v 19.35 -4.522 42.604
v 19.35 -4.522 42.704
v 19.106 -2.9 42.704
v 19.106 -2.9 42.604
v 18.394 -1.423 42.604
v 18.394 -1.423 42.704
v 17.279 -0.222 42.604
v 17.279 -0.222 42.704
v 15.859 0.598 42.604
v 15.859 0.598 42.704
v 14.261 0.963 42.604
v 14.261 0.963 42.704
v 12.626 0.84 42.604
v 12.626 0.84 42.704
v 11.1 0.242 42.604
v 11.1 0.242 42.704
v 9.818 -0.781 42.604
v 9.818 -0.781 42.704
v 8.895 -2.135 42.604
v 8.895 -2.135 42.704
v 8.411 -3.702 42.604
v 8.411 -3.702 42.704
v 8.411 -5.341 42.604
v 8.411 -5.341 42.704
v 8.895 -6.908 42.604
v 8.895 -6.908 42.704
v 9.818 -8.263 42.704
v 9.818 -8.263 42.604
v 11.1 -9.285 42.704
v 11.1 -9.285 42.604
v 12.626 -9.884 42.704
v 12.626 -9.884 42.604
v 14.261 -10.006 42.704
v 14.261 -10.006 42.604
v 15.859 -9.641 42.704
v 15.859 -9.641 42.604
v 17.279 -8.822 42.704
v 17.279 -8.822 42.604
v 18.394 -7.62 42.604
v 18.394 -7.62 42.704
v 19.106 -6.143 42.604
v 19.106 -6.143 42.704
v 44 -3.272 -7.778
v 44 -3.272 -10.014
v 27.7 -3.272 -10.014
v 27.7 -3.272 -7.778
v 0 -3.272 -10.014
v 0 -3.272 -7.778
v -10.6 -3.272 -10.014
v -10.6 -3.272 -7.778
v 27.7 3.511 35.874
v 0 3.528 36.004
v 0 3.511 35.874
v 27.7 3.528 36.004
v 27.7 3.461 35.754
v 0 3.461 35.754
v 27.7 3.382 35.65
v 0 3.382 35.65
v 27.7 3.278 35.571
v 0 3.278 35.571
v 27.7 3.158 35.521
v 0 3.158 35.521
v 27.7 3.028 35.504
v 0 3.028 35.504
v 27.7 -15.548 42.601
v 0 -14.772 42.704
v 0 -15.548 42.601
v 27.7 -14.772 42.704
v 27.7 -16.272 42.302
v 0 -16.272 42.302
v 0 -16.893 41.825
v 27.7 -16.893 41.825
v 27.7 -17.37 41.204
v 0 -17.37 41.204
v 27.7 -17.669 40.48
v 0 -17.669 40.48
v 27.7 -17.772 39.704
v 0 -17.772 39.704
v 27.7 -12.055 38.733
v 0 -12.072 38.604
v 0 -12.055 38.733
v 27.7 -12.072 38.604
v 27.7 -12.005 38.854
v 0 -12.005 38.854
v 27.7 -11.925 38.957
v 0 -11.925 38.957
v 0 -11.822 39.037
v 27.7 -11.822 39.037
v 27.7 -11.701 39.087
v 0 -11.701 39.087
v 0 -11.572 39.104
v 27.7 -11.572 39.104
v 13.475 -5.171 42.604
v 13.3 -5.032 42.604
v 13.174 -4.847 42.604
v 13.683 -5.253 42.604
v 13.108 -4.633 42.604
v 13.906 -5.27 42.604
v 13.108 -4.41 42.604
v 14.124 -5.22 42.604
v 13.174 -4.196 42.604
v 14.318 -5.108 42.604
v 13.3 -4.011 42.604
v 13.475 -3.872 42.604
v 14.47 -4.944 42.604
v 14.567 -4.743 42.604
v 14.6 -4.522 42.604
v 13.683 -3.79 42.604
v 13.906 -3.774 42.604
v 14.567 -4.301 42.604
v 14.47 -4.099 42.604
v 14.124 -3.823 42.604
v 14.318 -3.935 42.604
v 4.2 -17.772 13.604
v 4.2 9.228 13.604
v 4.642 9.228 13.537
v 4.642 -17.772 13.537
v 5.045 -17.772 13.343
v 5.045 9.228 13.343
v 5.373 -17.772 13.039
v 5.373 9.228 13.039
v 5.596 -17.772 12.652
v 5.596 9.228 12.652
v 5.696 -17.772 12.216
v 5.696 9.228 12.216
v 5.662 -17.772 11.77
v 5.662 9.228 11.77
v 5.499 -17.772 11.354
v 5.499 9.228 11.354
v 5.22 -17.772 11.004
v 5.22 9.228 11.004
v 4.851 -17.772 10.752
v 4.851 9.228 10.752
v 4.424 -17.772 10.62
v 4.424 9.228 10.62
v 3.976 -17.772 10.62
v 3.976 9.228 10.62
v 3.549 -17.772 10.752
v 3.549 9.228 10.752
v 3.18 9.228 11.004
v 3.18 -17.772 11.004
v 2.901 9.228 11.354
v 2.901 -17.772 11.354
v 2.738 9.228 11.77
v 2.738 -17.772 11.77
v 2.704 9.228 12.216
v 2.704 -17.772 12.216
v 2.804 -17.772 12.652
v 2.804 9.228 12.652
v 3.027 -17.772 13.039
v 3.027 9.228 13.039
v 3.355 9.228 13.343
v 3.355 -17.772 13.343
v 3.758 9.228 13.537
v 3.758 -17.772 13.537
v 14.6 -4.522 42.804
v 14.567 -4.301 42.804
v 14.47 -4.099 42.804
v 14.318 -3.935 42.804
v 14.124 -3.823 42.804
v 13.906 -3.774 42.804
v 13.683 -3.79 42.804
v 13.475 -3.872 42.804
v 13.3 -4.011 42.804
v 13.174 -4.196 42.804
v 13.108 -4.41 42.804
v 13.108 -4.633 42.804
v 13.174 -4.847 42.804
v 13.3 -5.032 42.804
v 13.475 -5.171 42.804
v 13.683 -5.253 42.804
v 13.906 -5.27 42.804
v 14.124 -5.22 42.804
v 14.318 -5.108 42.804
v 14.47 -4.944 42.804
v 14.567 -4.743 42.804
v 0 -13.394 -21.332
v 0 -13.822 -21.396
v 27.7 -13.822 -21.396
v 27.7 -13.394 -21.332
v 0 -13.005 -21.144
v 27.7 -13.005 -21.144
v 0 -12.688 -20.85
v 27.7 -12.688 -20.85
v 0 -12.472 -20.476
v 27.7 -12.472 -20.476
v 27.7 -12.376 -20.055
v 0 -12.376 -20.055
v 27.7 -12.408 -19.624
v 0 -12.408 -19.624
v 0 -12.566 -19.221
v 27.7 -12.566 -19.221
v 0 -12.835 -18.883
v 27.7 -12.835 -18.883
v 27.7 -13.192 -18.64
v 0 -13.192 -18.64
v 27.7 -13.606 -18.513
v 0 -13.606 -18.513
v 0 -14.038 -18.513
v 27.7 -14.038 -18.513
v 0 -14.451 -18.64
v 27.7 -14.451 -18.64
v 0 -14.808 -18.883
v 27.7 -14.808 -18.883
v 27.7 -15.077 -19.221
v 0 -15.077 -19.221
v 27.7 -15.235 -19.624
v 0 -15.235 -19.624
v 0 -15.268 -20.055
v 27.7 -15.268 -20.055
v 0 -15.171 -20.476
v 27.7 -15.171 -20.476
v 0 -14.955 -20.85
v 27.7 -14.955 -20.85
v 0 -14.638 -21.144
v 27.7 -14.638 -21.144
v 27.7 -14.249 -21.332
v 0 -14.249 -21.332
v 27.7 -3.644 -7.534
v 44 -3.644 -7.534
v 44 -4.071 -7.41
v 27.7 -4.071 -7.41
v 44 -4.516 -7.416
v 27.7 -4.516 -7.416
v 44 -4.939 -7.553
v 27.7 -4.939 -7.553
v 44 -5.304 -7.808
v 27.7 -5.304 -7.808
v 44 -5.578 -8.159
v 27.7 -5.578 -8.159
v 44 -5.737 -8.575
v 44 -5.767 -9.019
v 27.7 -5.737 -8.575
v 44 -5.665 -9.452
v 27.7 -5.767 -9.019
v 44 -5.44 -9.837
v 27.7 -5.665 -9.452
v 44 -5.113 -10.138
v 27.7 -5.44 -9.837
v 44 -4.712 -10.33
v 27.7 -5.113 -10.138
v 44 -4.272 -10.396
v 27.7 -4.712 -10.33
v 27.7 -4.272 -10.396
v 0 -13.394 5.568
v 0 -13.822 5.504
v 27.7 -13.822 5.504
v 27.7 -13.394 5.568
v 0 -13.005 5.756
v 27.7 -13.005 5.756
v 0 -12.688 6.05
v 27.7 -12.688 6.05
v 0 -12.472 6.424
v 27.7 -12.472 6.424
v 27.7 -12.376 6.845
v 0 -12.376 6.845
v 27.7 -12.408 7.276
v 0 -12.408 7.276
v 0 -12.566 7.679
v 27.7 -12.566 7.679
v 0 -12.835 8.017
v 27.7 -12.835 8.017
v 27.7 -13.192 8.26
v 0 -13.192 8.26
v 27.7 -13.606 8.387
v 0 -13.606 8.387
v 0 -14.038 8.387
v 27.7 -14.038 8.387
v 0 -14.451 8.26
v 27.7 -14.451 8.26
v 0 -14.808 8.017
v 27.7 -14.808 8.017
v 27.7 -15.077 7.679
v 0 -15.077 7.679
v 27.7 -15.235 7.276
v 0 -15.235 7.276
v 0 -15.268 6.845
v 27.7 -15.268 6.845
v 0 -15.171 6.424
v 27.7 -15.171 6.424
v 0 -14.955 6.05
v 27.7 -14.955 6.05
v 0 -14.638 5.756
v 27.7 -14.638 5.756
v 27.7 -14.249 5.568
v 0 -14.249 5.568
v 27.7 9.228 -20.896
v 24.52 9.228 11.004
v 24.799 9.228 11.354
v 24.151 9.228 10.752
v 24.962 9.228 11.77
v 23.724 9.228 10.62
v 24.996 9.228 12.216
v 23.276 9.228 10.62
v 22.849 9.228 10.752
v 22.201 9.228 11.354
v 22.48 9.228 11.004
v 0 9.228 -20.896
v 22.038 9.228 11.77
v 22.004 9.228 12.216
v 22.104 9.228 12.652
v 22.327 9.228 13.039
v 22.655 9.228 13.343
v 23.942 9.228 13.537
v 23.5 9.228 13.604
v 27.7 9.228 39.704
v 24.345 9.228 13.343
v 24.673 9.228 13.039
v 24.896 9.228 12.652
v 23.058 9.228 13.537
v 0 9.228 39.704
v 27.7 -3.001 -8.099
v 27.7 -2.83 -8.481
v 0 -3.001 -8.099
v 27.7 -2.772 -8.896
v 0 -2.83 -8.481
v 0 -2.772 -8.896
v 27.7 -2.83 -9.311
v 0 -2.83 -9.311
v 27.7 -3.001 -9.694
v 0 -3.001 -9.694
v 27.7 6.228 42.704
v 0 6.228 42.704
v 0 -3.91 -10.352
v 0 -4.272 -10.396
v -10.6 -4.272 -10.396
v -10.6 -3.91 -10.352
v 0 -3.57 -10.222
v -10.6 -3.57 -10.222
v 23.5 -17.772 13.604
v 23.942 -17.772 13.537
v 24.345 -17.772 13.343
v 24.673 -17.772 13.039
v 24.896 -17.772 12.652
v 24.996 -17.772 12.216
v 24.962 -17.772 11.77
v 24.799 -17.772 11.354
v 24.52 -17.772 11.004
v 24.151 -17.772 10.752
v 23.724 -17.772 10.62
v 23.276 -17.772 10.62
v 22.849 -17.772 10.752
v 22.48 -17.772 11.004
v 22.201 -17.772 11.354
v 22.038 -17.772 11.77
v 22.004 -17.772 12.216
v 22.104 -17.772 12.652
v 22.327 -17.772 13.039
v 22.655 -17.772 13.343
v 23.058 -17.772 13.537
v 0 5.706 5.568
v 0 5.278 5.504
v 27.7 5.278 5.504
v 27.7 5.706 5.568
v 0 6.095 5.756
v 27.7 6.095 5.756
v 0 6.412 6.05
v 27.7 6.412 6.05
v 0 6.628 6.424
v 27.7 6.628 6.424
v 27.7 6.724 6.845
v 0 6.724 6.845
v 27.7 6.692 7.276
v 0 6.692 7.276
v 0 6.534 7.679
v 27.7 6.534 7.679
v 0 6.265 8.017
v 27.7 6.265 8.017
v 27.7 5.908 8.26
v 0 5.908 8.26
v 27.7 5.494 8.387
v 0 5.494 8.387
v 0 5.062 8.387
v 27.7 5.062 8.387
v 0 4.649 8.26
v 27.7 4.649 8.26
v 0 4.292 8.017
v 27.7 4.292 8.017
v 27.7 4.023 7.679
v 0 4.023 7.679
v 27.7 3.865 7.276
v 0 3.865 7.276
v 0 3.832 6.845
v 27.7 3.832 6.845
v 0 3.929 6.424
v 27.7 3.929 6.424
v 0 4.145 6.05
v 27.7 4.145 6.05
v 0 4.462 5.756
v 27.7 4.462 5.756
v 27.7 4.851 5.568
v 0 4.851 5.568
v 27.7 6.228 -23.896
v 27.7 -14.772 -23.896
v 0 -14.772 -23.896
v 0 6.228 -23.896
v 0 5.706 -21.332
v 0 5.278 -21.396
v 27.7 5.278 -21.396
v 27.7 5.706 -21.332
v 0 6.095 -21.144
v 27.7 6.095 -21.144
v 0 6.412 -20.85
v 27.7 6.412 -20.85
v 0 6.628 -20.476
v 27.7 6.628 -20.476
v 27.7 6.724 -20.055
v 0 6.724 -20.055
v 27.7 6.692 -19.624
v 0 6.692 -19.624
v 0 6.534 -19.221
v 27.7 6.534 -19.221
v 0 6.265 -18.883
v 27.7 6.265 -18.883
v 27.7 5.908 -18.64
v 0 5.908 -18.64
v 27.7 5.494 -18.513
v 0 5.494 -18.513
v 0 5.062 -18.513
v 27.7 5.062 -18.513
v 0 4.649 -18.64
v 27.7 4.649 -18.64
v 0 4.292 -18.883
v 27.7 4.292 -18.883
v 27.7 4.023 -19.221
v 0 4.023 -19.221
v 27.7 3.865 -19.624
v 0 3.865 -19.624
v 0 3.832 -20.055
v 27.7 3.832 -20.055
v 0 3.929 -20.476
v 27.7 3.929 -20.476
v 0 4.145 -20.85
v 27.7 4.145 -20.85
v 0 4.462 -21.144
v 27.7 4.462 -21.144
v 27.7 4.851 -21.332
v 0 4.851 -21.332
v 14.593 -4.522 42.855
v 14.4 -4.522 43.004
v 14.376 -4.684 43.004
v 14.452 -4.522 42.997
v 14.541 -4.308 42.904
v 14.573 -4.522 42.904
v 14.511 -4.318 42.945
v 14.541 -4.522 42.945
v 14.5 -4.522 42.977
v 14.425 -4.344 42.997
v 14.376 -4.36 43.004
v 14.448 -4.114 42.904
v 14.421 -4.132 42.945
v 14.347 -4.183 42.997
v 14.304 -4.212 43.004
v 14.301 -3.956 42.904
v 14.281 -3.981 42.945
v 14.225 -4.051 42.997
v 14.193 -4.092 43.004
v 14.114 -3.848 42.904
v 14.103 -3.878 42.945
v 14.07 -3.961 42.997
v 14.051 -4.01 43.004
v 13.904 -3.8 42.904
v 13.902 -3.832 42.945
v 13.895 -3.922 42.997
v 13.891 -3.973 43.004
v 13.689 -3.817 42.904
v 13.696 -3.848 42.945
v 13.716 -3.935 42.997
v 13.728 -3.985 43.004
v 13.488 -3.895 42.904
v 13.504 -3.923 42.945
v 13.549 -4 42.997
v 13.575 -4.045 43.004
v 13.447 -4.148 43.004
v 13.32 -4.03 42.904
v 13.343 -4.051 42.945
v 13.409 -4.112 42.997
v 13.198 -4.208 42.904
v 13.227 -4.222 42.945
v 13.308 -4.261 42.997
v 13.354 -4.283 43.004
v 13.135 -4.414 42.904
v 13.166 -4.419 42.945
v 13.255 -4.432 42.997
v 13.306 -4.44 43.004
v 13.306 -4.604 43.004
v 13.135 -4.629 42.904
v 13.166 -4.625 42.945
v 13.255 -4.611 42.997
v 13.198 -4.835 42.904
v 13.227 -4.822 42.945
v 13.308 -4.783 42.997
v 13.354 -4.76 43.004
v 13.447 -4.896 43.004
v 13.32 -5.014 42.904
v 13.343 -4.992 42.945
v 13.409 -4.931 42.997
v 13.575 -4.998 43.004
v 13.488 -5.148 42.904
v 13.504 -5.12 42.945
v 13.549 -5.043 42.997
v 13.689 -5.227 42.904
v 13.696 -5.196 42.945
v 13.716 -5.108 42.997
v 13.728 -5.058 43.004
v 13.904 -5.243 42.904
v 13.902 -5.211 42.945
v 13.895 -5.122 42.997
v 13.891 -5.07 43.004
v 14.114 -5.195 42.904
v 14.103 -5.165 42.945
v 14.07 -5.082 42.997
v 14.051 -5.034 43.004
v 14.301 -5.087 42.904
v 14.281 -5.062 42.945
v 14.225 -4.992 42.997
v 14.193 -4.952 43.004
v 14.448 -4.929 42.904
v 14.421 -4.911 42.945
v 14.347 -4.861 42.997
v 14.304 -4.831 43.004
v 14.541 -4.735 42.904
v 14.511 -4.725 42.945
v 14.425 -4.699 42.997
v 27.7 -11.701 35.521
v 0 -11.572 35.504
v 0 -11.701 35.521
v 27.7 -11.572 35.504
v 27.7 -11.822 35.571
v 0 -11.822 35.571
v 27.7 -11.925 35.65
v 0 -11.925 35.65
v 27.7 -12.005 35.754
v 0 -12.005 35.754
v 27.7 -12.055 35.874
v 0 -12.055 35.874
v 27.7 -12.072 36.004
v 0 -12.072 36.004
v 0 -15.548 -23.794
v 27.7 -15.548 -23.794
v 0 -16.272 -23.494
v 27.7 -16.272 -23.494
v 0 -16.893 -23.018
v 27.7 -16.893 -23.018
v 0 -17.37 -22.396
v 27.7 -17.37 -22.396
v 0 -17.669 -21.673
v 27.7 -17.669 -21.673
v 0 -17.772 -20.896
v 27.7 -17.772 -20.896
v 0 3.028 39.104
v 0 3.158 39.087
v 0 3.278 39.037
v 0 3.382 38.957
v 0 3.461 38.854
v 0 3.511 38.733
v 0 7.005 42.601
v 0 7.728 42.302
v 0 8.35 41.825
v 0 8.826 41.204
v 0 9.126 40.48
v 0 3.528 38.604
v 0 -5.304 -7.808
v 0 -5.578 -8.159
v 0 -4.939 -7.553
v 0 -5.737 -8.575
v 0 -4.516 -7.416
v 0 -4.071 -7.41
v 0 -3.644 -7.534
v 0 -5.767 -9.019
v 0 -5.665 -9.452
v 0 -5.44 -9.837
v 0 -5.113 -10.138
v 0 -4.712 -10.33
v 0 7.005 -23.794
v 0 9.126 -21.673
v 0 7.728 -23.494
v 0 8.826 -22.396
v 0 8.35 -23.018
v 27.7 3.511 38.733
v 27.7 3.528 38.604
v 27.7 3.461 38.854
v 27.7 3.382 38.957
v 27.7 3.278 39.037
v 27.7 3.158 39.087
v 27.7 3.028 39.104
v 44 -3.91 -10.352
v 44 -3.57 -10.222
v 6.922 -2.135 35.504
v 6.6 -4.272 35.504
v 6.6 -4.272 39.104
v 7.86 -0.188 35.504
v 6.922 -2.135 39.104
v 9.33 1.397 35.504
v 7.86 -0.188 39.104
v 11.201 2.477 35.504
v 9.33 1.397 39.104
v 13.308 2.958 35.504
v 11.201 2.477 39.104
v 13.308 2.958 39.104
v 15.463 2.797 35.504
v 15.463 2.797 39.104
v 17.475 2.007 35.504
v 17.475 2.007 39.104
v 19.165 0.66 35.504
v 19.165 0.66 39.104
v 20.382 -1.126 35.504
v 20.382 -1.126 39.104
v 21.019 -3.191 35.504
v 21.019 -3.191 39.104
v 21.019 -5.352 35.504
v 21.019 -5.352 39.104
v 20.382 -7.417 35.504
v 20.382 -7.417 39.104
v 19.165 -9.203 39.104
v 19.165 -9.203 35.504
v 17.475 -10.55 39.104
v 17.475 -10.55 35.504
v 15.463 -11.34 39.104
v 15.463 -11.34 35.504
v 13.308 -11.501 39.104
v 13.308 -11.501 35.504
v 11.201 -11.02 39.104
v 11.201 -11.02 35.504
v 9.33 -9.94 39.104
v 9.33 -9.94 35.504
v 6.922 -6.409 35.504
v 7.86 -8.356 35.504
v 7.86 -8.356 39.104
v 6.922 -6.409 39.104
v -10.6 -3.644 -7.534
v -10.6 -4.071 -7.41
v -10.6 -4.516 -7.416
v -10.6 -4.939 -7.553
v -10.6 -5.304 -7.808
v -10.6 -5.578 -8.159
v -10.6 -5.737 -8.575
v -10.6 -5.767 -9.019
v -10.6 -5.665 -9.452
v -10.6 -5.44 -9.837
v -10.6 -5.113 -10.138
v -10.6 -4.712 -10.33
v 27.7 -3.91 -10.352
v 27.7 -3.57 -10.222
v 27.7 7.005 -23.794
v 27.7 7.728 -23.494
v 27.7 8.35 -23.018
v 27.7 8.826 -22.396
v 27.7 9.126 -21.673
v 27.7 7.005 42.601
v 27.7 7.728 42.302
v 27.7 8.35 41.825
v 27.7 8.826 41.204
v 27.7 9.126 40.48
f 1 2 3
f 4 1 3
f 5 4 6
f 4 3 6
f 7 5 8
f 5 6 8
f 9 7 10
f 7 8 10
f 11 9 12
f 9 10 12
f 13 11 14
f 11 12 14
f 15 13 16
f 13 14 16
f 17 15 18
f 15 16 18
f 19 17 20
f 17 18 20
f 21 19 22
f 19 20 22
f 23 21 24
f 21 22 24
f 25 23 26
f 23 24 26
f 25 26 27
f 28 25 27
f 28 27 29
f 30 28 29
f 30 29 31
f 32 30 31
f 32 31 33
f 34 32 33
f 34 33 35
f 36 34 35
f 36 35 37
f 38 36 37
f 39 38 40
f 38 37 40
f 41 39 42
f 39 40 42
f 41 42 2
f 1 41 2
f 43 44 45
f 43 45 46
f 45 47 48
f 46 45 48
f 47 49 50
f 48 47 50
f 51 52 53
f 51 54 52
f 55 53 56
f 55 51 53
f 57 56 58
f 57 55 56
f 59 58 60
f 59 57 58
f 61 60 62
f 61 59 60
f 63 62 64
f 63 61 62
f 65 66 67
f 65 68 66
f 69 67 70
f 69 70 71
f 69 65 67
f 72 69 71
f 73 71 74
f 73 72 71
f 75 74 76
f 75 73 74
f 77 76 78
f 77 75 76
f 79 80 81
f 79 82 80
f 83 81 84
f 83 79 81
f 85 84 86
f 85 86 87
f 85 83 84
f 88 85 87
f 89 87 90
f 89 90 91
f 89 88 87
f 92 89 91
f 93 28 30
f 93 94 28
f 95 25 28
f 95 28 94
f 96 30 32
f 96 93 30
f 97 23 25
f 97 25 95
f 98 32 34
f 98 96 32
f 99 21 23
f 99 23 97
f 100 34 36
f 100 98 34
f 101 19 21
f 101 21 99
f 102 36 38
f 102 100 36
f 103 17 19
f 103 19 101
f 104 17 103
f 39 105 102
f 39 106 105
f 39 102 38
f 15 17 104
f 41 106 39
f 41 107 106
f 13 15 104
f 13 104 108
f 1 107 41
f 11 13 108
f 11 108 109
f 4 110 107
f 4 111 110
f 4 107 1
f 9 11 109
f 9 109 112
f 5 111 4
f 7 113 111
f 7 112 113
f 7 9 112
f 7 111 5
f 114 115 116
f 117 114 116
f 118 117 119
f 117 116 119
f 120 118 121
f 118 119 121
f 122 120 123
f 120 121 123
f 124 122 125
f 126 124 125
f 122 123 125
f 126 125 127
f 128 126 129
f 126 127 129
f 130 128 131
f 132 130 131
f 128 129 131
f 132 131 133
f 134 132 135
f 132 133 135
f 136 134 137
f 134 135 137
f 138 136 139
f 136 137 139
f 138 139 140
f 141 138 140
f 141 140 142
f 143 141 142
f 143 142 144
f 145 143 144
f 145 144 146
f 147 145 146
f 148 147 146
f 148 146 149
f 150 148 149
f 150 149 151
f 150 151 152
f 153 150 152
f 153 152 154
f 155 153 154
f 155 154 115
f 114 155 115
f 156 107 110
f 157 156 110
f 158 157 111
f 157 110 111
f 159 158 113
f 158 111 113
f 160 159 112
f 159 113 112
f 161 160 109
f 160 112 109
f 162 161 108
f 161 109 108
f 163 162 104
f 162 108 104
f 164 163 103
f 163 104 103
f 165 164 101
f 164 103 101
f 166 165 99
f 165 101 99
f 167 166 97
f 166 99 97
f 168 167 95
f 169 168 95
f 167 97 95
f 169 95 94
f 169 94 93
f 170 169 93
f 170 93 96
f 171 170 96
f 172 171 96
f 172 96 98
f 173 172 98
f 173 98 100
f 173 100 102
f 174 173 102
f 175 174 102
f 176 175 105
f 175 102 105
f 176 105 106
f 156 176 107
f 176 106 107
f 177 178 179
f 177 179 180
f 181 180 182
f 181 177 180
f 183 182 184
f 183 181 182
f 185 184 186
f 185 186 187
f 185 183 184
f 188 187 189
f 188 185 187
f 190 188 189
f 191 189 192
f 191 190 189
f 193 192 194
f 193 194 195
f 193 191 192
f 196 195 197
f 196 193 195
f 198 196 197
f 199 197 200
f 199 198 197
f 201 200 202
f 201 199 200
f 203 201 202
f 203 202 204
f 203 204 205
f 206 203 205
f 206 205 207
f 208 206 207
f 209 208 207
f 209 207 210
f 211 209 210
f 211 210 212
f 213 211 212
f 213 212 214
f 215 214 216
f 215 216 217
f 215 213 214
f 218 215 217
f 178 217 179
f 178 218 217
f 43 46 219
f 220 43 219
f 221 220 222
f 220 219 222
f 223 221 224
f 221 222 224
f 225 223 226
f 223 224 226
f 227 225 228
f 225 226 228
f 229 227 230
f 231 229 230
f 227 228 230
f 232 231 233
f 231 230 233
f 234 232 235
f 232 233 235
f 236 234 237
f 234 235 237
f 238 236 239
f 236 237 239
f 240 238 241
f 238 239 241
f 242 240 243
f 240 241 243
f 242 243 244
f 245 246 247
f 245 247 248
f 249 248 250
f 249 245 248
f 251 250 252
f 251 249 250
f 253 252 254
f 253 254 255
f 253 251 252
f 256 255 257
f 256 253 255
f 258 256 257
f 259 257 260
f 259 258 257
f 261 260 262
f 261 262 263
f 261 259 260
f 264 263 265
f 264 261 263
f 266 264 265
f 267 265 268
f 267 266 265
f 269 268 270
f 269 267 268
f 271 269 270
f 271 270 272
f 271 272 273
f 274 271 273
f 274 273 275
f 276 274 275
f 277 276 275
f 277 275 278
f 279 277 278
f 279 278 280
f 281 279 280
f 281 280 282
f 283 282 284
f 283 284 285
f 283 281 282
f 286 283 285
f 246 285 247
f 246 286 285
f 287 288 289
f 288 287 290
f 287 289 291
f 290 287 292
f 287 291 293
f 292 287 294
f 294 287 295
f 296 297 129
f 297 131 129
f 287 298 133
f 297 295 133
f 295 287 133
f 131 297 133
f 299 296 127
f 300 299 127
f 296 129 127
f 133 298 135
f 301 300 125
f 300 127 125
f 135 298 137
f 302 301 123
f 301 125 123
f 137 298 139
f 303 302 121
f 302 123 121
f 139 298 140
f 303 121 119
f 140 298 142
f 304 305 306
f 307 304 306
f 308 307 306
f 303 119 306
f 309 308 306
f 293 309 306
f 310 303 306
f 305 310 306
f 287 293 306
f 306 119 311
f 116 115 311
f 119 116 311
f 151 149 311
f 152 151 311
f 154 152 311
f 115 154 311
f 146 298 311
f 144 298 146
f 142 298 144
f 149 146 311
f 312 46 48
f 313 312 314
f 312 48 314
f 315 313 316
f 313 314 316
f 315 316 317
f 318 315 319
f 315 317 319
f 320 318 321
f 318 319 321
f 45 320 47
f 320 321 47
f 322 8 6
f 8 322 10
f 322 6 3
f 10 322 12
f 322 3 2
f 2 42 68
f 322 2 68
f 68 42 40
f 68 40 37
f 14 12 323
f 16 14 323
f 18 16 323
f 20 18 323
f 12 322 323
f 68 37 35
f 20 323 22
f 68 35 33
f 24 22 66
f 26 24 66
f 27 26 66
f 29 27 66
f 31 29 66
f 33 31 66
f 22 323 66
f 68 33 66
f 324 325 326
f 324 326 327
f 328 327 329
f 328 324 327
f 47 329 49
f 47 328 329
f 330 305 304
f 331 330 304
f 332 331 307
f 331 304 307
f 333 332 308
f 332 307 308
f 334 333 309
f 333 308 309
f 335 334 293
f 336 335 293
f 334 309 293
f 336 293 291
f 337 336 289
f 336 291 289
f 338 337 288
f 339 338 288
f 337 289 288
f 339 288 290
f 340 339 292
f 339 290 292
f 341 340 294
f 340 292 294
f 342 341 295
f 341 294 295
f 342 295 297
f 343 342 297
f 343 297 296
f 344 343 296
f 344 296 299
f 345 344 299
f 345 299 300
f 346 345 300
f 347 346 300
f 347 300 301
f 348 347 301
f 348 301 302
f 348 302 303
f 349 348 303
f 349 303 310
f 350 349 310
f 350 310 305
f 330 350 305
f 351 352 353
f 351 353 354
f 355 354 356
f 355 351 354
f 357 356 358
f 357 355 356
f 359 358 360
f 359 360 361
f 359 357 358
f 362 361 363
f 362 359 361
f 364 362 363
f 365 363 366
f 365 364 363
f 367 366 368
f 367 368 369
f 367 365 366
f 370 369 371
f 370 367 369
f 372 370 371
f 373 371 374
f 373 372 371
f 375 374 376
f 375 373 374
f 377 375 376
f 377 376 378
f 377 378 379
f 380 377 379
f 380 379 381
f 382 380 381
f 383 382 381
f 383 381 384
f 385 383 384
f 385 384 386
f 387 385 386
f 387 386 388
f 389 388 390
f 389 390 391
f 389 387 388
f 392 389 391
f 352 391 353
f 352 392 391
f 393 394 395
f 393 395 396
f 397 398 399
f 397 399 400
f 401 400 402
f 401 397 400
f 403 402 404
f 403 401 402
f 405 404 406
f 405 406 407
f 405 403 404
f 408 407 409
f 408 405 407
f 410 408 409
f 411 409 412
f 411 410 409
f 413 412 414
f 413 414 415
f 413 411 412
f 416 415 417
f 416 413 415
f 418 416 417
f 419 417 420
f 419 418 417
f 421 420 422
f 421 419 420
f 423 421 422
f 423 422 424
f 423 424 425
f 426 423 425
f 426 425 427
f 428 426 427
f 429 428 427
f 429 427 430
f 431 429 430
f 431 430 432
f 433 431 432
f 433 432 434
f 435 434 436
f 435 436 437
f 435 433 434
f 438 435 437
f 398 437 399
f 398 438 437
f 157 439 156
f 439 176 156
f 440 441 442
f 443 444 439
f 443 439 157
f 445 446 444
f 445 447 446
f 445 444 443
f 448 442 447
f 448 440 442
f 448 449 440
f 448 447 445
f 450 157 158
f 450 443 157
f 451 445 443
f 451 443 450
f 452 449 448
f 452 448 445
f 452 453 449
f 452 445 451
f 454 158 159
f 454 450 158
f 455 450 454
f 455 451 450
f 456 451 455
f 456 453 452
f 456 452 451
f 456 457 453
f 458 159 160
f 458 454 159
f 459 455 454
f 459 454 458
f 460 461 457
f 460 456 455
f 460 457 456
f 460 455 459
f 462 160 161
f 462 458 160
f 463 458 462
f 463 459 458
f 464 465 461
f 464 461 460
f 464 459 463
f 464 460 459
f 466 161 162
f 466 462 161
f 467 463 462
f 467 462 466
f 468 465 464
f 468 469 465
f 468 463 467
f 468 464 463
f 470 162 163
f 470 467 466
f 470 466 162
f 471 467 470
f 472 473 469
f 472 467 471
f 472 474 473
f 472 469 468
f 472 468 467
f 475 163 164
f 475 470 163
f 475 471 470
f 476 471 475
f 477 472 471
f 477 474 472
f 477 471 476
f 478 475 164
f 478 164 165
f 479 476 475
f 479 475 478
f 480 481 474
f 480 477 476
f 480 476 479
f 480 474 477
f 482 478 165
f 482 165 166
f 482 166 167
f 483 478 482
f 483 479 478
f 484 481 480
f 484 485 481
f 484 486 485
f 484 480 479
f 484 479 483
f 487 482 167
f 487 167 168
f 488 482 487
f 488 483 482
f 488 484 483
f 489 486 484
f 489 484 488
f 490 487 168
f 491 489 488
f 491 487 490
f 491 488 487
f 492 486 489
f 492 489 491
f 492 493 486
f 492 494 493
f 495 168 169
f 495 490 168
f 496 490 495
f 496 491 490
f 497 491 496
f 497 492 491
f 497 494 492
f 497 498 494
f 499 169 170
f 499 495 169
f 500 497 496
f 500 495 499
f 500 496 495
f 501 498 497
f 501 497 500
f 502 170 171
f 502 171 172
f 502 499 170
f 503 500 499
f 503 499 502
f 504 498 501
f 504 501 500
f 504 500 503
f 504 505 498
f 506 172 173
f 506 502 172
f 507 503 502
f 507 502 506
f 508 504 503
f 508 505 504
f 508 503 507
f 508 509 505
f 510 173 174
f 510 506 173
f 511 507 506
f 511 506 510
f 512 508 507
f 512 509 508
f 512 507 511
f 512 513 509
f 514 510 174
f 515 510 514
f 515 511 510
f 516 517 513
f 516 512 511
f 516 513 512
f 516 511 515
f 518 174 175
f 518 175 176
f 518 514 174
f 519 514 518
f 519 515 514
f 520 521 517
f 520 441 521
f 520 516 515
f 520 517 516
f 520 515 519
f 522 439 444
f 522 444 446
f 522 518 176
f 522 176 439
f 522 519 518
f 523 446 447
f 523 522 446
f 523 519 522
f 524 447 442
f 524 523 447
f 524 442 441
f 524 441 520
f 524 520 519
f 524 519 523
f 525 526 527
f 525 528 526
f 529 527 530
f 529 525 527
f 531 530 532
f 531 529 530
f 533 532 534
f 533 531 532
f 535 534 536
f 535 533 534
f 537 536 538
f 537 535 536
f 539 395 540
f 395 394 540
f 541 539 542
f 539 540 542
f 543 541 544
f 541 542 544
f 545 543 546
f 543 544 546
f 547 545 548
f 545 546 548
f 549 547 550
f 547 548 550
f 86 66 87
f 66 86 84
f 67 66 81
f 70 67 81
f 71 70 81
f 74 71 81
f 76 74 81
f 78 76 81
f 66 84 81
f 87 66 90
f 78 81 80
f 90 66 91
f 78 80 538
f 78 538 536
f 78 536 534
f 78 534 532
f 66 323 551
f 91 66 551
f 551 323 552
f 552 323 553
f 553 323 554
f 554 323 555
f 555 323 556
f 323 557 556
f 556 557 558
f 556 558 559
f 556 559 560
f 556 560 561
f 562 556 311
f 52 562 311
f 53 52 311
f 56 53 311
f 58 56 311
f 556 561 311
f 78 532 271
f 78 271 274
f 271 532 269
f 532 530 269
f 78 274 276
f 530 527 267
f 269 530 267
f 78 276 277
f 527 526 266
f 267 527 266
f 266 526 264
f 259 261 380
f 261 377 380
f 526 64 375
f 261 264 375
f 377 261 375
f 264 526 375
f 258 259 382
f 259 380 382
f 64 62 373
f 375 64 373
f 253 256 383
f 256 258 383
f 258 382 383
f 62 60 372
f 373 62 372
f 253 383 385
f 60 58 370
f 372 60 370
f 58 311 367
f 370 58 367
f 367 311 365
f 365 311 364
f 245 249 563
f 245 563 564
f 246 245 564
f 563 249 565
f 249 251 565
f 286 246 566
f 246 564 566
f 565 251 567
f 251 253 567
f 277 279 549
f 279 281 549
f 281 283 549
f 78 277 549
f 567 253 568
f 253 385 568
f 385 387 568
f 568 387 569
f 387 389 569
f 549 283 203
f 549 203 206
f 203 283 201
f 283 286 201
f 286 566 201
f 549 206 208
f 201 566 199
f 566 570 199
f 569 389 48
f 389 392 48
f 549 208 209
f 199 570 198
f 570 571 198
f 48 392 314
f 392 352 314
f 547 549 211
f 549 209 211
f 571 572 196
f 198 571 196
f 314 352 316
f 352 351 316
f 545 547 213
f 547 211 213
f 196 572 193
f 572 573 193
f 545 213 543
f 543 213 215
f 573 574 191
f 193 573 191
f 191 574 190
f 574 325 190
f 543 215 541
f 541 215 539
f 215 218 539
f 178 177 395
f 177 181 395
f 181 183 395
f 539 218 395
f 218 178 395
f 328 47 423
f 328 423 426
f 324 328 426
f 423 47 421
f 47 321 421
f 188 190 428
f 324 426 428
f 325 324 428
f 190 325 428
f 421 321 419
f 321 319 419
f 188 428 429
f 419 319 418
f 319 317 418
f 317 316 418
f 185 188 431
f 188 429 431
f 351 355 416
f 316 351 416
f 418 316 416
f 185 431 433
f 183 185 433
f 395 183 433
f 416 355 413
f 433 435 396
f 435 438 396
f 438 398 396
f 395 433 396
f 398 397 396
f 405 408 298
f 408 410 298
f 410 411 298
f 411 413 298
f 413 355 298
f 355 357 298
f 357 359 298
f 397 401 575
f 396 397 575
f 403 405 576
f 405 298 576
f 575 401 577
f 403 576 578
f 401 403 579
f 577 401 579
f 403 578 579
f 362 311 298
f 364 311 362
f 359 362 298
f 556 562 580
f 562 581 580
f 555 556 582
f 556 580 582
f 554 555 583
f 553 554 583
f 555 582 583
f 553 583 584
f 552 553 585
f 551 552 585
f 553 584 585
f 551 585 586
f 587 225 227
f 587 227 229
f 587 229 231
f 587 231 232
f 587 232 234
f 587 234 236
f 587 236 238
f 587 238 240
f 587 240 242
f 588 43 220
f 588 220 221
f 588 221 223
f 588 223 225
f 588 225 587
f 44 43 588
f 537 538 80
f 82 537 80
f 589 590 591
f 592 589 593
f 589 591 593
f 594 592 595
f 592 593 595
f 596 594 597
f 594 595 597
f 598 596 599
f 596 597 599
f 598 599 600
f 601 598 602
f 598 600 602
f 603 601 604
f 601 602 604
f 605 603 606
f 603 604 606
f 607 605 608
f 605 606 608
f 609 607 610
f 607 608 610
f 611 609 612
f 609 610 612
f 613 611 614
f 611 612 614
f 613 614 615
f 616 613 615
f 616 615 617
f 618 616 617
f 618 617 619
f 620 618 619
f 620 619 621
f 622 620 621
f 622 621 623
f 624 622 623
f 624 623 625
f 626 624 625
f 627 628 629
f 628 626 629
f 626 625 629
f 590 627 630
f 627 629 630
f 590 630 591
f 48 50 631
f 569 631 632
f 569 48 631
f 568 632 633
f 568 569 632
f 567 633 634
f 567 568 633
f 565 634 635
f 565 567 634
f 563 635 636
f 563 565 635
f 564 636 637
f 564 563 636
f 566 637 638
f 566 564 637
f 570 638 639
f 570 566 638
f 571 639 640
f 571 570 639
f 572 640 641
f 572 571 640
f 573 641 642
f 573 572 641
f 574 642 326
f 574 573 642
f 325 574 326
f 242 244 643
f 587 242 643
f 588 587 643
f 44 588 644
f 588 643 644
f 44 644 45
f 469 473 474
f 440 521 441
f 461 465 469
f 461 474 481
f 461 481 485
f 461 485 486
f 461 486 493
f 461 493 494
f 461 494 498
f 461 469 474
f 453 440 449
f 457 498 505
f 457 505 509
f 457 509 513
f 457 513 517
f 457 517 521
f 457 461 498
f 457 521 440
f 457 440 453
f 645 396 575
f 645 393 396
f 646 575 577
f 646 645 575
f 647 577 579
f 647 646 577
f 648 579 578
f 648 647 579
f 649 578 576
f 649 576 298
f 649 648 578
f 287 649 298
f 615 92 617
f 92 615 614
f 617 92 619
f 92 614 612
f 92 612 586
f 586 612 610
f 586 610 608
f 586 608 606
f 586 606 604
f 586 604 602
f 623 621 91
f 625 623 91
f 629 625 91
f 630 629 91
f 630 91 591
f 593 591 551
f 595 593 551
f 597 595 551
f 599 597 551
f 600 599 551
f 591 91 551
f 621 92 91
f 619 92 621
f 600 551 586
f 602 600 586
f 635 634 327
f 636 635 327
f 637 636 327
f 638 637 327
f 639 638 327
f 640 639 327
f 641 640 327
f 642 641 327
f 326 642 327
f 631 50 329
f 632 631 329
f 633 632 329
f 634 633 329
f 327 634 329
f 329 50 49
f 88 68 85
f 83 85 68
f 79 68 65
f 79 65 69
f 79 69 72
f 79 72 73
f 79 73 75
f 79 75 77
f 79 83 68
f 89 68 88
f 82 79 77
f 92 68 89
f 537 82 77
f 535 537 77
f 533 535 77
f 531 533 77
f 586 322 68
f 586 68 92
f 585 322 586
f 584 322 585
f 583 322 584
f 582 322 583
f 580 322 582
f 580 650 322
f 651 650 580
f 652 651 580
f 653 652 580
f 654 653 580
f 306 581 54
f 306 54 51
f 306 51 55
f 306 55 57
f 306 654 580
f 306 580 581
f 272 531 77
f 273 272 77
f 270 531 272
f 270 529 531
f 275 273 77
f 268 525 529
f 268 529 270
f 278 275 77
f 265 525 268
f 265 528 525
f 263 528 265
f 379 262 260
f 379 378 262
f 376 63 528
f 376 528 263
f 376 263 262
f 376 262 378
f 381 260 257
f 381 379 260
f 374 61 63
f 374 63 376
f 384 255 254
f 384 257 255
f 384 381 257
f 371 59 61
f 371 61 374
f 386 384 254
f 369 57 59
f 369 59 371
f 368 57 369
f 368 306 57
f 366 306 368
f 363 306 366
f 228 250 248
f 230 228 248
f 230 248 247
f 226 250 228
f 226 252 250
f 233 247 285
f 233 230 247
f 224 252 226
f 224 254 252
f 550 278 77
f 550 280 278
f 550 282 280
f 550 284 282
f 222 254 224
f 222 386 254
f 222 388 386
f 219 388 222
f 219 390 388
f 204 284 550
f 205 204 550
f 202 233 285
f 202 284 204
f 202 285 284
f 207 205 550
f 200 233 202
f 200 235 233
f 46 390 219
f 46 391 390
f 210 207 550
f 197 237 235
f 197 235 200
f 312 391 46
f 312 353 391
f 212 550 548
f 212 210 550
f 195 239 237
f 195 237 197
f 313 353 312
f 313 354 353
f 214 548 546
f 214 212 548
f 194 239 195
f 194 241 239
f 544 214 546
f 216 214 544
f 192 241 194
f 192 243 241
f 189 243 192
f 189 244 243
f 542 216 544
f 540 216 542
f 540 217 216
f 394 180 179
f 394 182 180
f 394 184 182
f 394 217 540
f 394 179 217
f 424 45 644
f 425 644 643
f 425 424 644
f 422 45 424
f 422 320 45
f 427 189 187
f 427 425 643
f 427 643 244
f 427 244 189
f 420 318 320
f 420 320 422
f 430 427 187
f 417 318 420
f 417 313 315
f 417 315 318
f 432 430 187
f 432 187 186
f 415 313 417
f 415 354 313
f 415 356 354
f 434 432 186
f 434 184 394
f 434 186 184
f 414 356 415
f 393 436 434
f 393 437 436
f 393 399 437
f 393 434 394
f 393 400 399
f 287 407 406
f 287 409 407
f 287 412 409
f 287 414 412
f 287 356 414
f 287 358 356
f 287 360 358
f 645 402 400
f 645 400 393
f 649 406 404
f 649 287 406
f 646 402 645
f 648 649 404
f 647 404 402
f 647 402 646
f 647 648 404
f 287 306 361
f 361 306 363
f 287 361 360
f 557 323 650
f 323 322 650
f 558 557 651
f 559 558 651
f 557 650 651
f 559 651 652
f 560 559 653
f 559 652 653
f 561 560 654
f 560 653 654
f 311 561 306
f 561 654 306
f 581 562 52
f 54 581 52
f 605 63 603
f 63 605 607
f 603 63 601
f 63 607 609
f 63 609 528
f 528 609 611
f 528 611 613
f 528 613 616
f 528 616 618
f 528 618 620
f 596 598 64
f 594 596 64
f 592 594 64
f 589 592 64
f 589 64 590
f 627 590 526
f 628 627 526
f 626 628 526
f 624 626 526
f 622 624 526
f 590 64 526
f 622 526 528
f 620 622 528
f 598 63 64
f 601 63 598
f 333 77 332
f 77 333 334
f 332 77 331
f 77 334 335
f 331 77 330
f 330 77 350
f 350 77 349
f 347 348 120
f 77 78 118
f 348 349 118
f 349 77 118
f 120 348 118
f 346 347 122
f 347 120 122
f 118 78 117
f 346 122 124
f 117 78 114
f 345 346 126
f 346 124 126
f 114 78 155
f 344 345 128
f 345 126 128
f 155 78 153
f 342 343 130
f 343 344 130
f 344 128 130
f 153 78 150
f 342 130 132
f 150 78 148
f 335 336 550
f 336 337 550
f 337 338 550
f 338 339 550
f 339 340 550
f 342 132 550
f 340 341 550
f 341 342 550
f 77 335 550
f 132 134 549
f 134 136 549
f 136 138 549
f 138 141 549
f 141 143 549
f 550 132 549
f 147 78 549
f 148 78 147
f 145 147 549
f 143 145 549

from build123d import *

# Parameters (mm, degrees)
SKETCH1_W           = 66.6
SKETCH1_H           = 27
SKETCH1_R           = 1.5
SKETCH1_W_2         = 3.6
SKETCH1_H_2         = 15.6
SKETCH1_R_2         = 1.45
BOSS_EXTRUDE1_DEPTH = 27.7
FILLET1_R           = 3
FILLET2_R           = 0.5
SKETCH2_R           = 1.5
CUT_EXTRUDE1_DEPTH  = 27.7
BOSS_EXTRUDE2_DEPTH = 10.6
BOSS_EXTRUDE3_DEPTH = 44
SKETCH4_R           = 7.25
BOSS_EXTRUDE4_DEPTH = 19
SKETCH5_R           = 5.5
CUT_EXTRUDE2_DEPTH  = 0.1
SKETCH6_R           = 0.75
BOSS_EXTRUDE6_DEPTH = 0.4
FILLET3_R           = 0.2


with BuildPart() as part:
    # Sketch1 → Boss-Extrude1 (new body)
    with BuildSketch(Plane(origin=(0, 0, 0), x_dir=(0, 0, -1), z_dir=(1, 0, 0))):
        with Locations((-9.403654485, -4.271617427)):
            Rectangle(SKETCH1_W, SKETCH1_H)
        with Locations((8.896345515, -4.271617427)):
            Circle(SKETCH1_R, mode=Mode.SUBTRACT)
        with Locations((-37.303654485, -4.271617427)):
            Rectangle(SKETCH1_W_2, SKETCH1_H_2, mode=Mode.SUBTRACT)
        with Locations((-6.953654485, 5.278382573)):
            Circle(SKETCH1_R_2, mode=Mode.SUBTRACT)
        with Locations((19.946345515, 5.278382573)):
            Circle(SKETCH1_R_2, mode=Mode.SUBTRACT)
        with Locations((-6.953654485, -13.821617427)):
            Circle(SKETCH1_R_2, mode=Mode.SUBTRACT)
        with Locations((19.946345515, -13.821617427)):
            Circle(SKETCH1_R_2, mode=Mode.SUBTRACT)
    extrude(amount=BOSS_EXTRUDE1_DEPTH)

    # Fillet1
    fillet1_edges = [part.edges().sort_by_distance(p)[0] for p in [
        (13.85, -17.771617427, -23.896345515),
        (13.85, -17.771617427, 42.703654485),
        (13.85, 9.228382573, -23.896345515),
        (13.85, 9.228382573, 42.703654485),
    ]]
    fillet(fillet1_edges, radius=FILLET1_R)

    # Fillet2
    fillet2_edges = [part.edges().sort_by_distance(p)[0] for p in [
        (13.85, -12.071617427, 35.503654485),
        (13.85, -12.071617427, 39.103654485),
        (13.85, 3.528382573, 39.103654485),
        (13.85, 3.528382573, 35.503654485),
    ]]
    fillet(fillet2_edges, radius=FILLET2_R)

    # Sketch2 → Cut-Extrude1 (cut)
    with BuildSketch(Plane(origin=(0, 9.228382573, 0), x_dir=(1, 0, 0), z_dir=(0, 1, 0))):
        with Locations((4.2, -12.103654485)):
            Circle(SKETCH2_R)
        with Locations((23.5, -12.103654485)):
            Circle(SKETCH2_R)
    extrude(amount=-CUT_EXTRUDE1_DEPTH, mode=Mode.SUBTRACT)



with BuildPart() as body_2:
    # Sketch3 → Boss-Extrude2 (new body)
    with BuildSketch(Plane(origin=(0, 0, 0), x_dir=(0, 0, -1), z_dir=(1, 0, 0))):
        with BuildLine():
            Line((10.014379504, -3.271617427), (7.778311526, -3.271617427))
            ThreePointArc((7.778311526, -3.271617427), (8.36111238, -5.672875965), (10.396345515, -4.271617427))
            ThreePointArc((10.396345515, -4.271617427), (10.297604053, -3.736384292), (10.014379504, -3.271617427))
        make_face()
    extrude(amount=-BOSS_EXTRUDE2_DEPTH)


with BuildPart() as part_1:
    add(part.part)

    add(body_2.part)  # Boss-Extrude3 merges body 2
    # Sketch3<4> → Boss-Extrude3 (add)
    with BuildSketch(Plane(origin=(0, 0, 0), x_dir=(0, 0, -1), z_dir=(1, 0, 0))):
        with BuildLine():
            Line((10.014379504, -3.271617427), (7.778311526, -3.271617427))
            ThreePointArc((7.778311526, -3.271617427), (8.36111238, -5.672875965), (10.396345515, -4.271617427))
            ThreePointArc((10.396345515, -4.271617427), (10.297604053, -3.736384292), (10.014379504, -3.271617427))
        make_face()
    extrude(amount=BOSS_EXTRUDE3_DEPTH)

    # Sketch4 → Boss-Extrude4 (add)
    with BuildSketch(Plane(origin=(0, 0, 39.103654485), x_dir=(-1, 0, 0), z_dir=(0, 0, -1))):
        with Locations((-13.85, -4.271617427)):
            Circle(SKETCH4_R)
    extrude(amount=BOSS_EXTRUDE4_DEPTH)

    # Sketch5 → Cut-Extrude2 (cut)
    with BuildSketch(Plane.XY.offset(42.703654485)):
        with Locations((13.85, -4.521617427)):
            Circle(SKETCH5_R)
    extrude(amount=-CUT_EXTRUDE2_DEPTH, mode=Mode.SUBTRACT)

    # Sketch6 → Boss-Extrude6 (add)
    with BuildSketch(Plane.XY.offset(42.603654485)):
        with Locations((13.85, -4.521617427)):
            Circle(SKETCH6_R)
    extrude(amount=BOSS_EXTRUDE6_DEPTH)

    # Fillet3
    fillet3_edges = [part_1.edges().sort_by_distance(p)[0] for p in [
        (13.1, -4.521617427, 43.003654485),
    ]]
    fillet(fillet3_edges, radius=FILLET3_R)


solid = part_1.part
